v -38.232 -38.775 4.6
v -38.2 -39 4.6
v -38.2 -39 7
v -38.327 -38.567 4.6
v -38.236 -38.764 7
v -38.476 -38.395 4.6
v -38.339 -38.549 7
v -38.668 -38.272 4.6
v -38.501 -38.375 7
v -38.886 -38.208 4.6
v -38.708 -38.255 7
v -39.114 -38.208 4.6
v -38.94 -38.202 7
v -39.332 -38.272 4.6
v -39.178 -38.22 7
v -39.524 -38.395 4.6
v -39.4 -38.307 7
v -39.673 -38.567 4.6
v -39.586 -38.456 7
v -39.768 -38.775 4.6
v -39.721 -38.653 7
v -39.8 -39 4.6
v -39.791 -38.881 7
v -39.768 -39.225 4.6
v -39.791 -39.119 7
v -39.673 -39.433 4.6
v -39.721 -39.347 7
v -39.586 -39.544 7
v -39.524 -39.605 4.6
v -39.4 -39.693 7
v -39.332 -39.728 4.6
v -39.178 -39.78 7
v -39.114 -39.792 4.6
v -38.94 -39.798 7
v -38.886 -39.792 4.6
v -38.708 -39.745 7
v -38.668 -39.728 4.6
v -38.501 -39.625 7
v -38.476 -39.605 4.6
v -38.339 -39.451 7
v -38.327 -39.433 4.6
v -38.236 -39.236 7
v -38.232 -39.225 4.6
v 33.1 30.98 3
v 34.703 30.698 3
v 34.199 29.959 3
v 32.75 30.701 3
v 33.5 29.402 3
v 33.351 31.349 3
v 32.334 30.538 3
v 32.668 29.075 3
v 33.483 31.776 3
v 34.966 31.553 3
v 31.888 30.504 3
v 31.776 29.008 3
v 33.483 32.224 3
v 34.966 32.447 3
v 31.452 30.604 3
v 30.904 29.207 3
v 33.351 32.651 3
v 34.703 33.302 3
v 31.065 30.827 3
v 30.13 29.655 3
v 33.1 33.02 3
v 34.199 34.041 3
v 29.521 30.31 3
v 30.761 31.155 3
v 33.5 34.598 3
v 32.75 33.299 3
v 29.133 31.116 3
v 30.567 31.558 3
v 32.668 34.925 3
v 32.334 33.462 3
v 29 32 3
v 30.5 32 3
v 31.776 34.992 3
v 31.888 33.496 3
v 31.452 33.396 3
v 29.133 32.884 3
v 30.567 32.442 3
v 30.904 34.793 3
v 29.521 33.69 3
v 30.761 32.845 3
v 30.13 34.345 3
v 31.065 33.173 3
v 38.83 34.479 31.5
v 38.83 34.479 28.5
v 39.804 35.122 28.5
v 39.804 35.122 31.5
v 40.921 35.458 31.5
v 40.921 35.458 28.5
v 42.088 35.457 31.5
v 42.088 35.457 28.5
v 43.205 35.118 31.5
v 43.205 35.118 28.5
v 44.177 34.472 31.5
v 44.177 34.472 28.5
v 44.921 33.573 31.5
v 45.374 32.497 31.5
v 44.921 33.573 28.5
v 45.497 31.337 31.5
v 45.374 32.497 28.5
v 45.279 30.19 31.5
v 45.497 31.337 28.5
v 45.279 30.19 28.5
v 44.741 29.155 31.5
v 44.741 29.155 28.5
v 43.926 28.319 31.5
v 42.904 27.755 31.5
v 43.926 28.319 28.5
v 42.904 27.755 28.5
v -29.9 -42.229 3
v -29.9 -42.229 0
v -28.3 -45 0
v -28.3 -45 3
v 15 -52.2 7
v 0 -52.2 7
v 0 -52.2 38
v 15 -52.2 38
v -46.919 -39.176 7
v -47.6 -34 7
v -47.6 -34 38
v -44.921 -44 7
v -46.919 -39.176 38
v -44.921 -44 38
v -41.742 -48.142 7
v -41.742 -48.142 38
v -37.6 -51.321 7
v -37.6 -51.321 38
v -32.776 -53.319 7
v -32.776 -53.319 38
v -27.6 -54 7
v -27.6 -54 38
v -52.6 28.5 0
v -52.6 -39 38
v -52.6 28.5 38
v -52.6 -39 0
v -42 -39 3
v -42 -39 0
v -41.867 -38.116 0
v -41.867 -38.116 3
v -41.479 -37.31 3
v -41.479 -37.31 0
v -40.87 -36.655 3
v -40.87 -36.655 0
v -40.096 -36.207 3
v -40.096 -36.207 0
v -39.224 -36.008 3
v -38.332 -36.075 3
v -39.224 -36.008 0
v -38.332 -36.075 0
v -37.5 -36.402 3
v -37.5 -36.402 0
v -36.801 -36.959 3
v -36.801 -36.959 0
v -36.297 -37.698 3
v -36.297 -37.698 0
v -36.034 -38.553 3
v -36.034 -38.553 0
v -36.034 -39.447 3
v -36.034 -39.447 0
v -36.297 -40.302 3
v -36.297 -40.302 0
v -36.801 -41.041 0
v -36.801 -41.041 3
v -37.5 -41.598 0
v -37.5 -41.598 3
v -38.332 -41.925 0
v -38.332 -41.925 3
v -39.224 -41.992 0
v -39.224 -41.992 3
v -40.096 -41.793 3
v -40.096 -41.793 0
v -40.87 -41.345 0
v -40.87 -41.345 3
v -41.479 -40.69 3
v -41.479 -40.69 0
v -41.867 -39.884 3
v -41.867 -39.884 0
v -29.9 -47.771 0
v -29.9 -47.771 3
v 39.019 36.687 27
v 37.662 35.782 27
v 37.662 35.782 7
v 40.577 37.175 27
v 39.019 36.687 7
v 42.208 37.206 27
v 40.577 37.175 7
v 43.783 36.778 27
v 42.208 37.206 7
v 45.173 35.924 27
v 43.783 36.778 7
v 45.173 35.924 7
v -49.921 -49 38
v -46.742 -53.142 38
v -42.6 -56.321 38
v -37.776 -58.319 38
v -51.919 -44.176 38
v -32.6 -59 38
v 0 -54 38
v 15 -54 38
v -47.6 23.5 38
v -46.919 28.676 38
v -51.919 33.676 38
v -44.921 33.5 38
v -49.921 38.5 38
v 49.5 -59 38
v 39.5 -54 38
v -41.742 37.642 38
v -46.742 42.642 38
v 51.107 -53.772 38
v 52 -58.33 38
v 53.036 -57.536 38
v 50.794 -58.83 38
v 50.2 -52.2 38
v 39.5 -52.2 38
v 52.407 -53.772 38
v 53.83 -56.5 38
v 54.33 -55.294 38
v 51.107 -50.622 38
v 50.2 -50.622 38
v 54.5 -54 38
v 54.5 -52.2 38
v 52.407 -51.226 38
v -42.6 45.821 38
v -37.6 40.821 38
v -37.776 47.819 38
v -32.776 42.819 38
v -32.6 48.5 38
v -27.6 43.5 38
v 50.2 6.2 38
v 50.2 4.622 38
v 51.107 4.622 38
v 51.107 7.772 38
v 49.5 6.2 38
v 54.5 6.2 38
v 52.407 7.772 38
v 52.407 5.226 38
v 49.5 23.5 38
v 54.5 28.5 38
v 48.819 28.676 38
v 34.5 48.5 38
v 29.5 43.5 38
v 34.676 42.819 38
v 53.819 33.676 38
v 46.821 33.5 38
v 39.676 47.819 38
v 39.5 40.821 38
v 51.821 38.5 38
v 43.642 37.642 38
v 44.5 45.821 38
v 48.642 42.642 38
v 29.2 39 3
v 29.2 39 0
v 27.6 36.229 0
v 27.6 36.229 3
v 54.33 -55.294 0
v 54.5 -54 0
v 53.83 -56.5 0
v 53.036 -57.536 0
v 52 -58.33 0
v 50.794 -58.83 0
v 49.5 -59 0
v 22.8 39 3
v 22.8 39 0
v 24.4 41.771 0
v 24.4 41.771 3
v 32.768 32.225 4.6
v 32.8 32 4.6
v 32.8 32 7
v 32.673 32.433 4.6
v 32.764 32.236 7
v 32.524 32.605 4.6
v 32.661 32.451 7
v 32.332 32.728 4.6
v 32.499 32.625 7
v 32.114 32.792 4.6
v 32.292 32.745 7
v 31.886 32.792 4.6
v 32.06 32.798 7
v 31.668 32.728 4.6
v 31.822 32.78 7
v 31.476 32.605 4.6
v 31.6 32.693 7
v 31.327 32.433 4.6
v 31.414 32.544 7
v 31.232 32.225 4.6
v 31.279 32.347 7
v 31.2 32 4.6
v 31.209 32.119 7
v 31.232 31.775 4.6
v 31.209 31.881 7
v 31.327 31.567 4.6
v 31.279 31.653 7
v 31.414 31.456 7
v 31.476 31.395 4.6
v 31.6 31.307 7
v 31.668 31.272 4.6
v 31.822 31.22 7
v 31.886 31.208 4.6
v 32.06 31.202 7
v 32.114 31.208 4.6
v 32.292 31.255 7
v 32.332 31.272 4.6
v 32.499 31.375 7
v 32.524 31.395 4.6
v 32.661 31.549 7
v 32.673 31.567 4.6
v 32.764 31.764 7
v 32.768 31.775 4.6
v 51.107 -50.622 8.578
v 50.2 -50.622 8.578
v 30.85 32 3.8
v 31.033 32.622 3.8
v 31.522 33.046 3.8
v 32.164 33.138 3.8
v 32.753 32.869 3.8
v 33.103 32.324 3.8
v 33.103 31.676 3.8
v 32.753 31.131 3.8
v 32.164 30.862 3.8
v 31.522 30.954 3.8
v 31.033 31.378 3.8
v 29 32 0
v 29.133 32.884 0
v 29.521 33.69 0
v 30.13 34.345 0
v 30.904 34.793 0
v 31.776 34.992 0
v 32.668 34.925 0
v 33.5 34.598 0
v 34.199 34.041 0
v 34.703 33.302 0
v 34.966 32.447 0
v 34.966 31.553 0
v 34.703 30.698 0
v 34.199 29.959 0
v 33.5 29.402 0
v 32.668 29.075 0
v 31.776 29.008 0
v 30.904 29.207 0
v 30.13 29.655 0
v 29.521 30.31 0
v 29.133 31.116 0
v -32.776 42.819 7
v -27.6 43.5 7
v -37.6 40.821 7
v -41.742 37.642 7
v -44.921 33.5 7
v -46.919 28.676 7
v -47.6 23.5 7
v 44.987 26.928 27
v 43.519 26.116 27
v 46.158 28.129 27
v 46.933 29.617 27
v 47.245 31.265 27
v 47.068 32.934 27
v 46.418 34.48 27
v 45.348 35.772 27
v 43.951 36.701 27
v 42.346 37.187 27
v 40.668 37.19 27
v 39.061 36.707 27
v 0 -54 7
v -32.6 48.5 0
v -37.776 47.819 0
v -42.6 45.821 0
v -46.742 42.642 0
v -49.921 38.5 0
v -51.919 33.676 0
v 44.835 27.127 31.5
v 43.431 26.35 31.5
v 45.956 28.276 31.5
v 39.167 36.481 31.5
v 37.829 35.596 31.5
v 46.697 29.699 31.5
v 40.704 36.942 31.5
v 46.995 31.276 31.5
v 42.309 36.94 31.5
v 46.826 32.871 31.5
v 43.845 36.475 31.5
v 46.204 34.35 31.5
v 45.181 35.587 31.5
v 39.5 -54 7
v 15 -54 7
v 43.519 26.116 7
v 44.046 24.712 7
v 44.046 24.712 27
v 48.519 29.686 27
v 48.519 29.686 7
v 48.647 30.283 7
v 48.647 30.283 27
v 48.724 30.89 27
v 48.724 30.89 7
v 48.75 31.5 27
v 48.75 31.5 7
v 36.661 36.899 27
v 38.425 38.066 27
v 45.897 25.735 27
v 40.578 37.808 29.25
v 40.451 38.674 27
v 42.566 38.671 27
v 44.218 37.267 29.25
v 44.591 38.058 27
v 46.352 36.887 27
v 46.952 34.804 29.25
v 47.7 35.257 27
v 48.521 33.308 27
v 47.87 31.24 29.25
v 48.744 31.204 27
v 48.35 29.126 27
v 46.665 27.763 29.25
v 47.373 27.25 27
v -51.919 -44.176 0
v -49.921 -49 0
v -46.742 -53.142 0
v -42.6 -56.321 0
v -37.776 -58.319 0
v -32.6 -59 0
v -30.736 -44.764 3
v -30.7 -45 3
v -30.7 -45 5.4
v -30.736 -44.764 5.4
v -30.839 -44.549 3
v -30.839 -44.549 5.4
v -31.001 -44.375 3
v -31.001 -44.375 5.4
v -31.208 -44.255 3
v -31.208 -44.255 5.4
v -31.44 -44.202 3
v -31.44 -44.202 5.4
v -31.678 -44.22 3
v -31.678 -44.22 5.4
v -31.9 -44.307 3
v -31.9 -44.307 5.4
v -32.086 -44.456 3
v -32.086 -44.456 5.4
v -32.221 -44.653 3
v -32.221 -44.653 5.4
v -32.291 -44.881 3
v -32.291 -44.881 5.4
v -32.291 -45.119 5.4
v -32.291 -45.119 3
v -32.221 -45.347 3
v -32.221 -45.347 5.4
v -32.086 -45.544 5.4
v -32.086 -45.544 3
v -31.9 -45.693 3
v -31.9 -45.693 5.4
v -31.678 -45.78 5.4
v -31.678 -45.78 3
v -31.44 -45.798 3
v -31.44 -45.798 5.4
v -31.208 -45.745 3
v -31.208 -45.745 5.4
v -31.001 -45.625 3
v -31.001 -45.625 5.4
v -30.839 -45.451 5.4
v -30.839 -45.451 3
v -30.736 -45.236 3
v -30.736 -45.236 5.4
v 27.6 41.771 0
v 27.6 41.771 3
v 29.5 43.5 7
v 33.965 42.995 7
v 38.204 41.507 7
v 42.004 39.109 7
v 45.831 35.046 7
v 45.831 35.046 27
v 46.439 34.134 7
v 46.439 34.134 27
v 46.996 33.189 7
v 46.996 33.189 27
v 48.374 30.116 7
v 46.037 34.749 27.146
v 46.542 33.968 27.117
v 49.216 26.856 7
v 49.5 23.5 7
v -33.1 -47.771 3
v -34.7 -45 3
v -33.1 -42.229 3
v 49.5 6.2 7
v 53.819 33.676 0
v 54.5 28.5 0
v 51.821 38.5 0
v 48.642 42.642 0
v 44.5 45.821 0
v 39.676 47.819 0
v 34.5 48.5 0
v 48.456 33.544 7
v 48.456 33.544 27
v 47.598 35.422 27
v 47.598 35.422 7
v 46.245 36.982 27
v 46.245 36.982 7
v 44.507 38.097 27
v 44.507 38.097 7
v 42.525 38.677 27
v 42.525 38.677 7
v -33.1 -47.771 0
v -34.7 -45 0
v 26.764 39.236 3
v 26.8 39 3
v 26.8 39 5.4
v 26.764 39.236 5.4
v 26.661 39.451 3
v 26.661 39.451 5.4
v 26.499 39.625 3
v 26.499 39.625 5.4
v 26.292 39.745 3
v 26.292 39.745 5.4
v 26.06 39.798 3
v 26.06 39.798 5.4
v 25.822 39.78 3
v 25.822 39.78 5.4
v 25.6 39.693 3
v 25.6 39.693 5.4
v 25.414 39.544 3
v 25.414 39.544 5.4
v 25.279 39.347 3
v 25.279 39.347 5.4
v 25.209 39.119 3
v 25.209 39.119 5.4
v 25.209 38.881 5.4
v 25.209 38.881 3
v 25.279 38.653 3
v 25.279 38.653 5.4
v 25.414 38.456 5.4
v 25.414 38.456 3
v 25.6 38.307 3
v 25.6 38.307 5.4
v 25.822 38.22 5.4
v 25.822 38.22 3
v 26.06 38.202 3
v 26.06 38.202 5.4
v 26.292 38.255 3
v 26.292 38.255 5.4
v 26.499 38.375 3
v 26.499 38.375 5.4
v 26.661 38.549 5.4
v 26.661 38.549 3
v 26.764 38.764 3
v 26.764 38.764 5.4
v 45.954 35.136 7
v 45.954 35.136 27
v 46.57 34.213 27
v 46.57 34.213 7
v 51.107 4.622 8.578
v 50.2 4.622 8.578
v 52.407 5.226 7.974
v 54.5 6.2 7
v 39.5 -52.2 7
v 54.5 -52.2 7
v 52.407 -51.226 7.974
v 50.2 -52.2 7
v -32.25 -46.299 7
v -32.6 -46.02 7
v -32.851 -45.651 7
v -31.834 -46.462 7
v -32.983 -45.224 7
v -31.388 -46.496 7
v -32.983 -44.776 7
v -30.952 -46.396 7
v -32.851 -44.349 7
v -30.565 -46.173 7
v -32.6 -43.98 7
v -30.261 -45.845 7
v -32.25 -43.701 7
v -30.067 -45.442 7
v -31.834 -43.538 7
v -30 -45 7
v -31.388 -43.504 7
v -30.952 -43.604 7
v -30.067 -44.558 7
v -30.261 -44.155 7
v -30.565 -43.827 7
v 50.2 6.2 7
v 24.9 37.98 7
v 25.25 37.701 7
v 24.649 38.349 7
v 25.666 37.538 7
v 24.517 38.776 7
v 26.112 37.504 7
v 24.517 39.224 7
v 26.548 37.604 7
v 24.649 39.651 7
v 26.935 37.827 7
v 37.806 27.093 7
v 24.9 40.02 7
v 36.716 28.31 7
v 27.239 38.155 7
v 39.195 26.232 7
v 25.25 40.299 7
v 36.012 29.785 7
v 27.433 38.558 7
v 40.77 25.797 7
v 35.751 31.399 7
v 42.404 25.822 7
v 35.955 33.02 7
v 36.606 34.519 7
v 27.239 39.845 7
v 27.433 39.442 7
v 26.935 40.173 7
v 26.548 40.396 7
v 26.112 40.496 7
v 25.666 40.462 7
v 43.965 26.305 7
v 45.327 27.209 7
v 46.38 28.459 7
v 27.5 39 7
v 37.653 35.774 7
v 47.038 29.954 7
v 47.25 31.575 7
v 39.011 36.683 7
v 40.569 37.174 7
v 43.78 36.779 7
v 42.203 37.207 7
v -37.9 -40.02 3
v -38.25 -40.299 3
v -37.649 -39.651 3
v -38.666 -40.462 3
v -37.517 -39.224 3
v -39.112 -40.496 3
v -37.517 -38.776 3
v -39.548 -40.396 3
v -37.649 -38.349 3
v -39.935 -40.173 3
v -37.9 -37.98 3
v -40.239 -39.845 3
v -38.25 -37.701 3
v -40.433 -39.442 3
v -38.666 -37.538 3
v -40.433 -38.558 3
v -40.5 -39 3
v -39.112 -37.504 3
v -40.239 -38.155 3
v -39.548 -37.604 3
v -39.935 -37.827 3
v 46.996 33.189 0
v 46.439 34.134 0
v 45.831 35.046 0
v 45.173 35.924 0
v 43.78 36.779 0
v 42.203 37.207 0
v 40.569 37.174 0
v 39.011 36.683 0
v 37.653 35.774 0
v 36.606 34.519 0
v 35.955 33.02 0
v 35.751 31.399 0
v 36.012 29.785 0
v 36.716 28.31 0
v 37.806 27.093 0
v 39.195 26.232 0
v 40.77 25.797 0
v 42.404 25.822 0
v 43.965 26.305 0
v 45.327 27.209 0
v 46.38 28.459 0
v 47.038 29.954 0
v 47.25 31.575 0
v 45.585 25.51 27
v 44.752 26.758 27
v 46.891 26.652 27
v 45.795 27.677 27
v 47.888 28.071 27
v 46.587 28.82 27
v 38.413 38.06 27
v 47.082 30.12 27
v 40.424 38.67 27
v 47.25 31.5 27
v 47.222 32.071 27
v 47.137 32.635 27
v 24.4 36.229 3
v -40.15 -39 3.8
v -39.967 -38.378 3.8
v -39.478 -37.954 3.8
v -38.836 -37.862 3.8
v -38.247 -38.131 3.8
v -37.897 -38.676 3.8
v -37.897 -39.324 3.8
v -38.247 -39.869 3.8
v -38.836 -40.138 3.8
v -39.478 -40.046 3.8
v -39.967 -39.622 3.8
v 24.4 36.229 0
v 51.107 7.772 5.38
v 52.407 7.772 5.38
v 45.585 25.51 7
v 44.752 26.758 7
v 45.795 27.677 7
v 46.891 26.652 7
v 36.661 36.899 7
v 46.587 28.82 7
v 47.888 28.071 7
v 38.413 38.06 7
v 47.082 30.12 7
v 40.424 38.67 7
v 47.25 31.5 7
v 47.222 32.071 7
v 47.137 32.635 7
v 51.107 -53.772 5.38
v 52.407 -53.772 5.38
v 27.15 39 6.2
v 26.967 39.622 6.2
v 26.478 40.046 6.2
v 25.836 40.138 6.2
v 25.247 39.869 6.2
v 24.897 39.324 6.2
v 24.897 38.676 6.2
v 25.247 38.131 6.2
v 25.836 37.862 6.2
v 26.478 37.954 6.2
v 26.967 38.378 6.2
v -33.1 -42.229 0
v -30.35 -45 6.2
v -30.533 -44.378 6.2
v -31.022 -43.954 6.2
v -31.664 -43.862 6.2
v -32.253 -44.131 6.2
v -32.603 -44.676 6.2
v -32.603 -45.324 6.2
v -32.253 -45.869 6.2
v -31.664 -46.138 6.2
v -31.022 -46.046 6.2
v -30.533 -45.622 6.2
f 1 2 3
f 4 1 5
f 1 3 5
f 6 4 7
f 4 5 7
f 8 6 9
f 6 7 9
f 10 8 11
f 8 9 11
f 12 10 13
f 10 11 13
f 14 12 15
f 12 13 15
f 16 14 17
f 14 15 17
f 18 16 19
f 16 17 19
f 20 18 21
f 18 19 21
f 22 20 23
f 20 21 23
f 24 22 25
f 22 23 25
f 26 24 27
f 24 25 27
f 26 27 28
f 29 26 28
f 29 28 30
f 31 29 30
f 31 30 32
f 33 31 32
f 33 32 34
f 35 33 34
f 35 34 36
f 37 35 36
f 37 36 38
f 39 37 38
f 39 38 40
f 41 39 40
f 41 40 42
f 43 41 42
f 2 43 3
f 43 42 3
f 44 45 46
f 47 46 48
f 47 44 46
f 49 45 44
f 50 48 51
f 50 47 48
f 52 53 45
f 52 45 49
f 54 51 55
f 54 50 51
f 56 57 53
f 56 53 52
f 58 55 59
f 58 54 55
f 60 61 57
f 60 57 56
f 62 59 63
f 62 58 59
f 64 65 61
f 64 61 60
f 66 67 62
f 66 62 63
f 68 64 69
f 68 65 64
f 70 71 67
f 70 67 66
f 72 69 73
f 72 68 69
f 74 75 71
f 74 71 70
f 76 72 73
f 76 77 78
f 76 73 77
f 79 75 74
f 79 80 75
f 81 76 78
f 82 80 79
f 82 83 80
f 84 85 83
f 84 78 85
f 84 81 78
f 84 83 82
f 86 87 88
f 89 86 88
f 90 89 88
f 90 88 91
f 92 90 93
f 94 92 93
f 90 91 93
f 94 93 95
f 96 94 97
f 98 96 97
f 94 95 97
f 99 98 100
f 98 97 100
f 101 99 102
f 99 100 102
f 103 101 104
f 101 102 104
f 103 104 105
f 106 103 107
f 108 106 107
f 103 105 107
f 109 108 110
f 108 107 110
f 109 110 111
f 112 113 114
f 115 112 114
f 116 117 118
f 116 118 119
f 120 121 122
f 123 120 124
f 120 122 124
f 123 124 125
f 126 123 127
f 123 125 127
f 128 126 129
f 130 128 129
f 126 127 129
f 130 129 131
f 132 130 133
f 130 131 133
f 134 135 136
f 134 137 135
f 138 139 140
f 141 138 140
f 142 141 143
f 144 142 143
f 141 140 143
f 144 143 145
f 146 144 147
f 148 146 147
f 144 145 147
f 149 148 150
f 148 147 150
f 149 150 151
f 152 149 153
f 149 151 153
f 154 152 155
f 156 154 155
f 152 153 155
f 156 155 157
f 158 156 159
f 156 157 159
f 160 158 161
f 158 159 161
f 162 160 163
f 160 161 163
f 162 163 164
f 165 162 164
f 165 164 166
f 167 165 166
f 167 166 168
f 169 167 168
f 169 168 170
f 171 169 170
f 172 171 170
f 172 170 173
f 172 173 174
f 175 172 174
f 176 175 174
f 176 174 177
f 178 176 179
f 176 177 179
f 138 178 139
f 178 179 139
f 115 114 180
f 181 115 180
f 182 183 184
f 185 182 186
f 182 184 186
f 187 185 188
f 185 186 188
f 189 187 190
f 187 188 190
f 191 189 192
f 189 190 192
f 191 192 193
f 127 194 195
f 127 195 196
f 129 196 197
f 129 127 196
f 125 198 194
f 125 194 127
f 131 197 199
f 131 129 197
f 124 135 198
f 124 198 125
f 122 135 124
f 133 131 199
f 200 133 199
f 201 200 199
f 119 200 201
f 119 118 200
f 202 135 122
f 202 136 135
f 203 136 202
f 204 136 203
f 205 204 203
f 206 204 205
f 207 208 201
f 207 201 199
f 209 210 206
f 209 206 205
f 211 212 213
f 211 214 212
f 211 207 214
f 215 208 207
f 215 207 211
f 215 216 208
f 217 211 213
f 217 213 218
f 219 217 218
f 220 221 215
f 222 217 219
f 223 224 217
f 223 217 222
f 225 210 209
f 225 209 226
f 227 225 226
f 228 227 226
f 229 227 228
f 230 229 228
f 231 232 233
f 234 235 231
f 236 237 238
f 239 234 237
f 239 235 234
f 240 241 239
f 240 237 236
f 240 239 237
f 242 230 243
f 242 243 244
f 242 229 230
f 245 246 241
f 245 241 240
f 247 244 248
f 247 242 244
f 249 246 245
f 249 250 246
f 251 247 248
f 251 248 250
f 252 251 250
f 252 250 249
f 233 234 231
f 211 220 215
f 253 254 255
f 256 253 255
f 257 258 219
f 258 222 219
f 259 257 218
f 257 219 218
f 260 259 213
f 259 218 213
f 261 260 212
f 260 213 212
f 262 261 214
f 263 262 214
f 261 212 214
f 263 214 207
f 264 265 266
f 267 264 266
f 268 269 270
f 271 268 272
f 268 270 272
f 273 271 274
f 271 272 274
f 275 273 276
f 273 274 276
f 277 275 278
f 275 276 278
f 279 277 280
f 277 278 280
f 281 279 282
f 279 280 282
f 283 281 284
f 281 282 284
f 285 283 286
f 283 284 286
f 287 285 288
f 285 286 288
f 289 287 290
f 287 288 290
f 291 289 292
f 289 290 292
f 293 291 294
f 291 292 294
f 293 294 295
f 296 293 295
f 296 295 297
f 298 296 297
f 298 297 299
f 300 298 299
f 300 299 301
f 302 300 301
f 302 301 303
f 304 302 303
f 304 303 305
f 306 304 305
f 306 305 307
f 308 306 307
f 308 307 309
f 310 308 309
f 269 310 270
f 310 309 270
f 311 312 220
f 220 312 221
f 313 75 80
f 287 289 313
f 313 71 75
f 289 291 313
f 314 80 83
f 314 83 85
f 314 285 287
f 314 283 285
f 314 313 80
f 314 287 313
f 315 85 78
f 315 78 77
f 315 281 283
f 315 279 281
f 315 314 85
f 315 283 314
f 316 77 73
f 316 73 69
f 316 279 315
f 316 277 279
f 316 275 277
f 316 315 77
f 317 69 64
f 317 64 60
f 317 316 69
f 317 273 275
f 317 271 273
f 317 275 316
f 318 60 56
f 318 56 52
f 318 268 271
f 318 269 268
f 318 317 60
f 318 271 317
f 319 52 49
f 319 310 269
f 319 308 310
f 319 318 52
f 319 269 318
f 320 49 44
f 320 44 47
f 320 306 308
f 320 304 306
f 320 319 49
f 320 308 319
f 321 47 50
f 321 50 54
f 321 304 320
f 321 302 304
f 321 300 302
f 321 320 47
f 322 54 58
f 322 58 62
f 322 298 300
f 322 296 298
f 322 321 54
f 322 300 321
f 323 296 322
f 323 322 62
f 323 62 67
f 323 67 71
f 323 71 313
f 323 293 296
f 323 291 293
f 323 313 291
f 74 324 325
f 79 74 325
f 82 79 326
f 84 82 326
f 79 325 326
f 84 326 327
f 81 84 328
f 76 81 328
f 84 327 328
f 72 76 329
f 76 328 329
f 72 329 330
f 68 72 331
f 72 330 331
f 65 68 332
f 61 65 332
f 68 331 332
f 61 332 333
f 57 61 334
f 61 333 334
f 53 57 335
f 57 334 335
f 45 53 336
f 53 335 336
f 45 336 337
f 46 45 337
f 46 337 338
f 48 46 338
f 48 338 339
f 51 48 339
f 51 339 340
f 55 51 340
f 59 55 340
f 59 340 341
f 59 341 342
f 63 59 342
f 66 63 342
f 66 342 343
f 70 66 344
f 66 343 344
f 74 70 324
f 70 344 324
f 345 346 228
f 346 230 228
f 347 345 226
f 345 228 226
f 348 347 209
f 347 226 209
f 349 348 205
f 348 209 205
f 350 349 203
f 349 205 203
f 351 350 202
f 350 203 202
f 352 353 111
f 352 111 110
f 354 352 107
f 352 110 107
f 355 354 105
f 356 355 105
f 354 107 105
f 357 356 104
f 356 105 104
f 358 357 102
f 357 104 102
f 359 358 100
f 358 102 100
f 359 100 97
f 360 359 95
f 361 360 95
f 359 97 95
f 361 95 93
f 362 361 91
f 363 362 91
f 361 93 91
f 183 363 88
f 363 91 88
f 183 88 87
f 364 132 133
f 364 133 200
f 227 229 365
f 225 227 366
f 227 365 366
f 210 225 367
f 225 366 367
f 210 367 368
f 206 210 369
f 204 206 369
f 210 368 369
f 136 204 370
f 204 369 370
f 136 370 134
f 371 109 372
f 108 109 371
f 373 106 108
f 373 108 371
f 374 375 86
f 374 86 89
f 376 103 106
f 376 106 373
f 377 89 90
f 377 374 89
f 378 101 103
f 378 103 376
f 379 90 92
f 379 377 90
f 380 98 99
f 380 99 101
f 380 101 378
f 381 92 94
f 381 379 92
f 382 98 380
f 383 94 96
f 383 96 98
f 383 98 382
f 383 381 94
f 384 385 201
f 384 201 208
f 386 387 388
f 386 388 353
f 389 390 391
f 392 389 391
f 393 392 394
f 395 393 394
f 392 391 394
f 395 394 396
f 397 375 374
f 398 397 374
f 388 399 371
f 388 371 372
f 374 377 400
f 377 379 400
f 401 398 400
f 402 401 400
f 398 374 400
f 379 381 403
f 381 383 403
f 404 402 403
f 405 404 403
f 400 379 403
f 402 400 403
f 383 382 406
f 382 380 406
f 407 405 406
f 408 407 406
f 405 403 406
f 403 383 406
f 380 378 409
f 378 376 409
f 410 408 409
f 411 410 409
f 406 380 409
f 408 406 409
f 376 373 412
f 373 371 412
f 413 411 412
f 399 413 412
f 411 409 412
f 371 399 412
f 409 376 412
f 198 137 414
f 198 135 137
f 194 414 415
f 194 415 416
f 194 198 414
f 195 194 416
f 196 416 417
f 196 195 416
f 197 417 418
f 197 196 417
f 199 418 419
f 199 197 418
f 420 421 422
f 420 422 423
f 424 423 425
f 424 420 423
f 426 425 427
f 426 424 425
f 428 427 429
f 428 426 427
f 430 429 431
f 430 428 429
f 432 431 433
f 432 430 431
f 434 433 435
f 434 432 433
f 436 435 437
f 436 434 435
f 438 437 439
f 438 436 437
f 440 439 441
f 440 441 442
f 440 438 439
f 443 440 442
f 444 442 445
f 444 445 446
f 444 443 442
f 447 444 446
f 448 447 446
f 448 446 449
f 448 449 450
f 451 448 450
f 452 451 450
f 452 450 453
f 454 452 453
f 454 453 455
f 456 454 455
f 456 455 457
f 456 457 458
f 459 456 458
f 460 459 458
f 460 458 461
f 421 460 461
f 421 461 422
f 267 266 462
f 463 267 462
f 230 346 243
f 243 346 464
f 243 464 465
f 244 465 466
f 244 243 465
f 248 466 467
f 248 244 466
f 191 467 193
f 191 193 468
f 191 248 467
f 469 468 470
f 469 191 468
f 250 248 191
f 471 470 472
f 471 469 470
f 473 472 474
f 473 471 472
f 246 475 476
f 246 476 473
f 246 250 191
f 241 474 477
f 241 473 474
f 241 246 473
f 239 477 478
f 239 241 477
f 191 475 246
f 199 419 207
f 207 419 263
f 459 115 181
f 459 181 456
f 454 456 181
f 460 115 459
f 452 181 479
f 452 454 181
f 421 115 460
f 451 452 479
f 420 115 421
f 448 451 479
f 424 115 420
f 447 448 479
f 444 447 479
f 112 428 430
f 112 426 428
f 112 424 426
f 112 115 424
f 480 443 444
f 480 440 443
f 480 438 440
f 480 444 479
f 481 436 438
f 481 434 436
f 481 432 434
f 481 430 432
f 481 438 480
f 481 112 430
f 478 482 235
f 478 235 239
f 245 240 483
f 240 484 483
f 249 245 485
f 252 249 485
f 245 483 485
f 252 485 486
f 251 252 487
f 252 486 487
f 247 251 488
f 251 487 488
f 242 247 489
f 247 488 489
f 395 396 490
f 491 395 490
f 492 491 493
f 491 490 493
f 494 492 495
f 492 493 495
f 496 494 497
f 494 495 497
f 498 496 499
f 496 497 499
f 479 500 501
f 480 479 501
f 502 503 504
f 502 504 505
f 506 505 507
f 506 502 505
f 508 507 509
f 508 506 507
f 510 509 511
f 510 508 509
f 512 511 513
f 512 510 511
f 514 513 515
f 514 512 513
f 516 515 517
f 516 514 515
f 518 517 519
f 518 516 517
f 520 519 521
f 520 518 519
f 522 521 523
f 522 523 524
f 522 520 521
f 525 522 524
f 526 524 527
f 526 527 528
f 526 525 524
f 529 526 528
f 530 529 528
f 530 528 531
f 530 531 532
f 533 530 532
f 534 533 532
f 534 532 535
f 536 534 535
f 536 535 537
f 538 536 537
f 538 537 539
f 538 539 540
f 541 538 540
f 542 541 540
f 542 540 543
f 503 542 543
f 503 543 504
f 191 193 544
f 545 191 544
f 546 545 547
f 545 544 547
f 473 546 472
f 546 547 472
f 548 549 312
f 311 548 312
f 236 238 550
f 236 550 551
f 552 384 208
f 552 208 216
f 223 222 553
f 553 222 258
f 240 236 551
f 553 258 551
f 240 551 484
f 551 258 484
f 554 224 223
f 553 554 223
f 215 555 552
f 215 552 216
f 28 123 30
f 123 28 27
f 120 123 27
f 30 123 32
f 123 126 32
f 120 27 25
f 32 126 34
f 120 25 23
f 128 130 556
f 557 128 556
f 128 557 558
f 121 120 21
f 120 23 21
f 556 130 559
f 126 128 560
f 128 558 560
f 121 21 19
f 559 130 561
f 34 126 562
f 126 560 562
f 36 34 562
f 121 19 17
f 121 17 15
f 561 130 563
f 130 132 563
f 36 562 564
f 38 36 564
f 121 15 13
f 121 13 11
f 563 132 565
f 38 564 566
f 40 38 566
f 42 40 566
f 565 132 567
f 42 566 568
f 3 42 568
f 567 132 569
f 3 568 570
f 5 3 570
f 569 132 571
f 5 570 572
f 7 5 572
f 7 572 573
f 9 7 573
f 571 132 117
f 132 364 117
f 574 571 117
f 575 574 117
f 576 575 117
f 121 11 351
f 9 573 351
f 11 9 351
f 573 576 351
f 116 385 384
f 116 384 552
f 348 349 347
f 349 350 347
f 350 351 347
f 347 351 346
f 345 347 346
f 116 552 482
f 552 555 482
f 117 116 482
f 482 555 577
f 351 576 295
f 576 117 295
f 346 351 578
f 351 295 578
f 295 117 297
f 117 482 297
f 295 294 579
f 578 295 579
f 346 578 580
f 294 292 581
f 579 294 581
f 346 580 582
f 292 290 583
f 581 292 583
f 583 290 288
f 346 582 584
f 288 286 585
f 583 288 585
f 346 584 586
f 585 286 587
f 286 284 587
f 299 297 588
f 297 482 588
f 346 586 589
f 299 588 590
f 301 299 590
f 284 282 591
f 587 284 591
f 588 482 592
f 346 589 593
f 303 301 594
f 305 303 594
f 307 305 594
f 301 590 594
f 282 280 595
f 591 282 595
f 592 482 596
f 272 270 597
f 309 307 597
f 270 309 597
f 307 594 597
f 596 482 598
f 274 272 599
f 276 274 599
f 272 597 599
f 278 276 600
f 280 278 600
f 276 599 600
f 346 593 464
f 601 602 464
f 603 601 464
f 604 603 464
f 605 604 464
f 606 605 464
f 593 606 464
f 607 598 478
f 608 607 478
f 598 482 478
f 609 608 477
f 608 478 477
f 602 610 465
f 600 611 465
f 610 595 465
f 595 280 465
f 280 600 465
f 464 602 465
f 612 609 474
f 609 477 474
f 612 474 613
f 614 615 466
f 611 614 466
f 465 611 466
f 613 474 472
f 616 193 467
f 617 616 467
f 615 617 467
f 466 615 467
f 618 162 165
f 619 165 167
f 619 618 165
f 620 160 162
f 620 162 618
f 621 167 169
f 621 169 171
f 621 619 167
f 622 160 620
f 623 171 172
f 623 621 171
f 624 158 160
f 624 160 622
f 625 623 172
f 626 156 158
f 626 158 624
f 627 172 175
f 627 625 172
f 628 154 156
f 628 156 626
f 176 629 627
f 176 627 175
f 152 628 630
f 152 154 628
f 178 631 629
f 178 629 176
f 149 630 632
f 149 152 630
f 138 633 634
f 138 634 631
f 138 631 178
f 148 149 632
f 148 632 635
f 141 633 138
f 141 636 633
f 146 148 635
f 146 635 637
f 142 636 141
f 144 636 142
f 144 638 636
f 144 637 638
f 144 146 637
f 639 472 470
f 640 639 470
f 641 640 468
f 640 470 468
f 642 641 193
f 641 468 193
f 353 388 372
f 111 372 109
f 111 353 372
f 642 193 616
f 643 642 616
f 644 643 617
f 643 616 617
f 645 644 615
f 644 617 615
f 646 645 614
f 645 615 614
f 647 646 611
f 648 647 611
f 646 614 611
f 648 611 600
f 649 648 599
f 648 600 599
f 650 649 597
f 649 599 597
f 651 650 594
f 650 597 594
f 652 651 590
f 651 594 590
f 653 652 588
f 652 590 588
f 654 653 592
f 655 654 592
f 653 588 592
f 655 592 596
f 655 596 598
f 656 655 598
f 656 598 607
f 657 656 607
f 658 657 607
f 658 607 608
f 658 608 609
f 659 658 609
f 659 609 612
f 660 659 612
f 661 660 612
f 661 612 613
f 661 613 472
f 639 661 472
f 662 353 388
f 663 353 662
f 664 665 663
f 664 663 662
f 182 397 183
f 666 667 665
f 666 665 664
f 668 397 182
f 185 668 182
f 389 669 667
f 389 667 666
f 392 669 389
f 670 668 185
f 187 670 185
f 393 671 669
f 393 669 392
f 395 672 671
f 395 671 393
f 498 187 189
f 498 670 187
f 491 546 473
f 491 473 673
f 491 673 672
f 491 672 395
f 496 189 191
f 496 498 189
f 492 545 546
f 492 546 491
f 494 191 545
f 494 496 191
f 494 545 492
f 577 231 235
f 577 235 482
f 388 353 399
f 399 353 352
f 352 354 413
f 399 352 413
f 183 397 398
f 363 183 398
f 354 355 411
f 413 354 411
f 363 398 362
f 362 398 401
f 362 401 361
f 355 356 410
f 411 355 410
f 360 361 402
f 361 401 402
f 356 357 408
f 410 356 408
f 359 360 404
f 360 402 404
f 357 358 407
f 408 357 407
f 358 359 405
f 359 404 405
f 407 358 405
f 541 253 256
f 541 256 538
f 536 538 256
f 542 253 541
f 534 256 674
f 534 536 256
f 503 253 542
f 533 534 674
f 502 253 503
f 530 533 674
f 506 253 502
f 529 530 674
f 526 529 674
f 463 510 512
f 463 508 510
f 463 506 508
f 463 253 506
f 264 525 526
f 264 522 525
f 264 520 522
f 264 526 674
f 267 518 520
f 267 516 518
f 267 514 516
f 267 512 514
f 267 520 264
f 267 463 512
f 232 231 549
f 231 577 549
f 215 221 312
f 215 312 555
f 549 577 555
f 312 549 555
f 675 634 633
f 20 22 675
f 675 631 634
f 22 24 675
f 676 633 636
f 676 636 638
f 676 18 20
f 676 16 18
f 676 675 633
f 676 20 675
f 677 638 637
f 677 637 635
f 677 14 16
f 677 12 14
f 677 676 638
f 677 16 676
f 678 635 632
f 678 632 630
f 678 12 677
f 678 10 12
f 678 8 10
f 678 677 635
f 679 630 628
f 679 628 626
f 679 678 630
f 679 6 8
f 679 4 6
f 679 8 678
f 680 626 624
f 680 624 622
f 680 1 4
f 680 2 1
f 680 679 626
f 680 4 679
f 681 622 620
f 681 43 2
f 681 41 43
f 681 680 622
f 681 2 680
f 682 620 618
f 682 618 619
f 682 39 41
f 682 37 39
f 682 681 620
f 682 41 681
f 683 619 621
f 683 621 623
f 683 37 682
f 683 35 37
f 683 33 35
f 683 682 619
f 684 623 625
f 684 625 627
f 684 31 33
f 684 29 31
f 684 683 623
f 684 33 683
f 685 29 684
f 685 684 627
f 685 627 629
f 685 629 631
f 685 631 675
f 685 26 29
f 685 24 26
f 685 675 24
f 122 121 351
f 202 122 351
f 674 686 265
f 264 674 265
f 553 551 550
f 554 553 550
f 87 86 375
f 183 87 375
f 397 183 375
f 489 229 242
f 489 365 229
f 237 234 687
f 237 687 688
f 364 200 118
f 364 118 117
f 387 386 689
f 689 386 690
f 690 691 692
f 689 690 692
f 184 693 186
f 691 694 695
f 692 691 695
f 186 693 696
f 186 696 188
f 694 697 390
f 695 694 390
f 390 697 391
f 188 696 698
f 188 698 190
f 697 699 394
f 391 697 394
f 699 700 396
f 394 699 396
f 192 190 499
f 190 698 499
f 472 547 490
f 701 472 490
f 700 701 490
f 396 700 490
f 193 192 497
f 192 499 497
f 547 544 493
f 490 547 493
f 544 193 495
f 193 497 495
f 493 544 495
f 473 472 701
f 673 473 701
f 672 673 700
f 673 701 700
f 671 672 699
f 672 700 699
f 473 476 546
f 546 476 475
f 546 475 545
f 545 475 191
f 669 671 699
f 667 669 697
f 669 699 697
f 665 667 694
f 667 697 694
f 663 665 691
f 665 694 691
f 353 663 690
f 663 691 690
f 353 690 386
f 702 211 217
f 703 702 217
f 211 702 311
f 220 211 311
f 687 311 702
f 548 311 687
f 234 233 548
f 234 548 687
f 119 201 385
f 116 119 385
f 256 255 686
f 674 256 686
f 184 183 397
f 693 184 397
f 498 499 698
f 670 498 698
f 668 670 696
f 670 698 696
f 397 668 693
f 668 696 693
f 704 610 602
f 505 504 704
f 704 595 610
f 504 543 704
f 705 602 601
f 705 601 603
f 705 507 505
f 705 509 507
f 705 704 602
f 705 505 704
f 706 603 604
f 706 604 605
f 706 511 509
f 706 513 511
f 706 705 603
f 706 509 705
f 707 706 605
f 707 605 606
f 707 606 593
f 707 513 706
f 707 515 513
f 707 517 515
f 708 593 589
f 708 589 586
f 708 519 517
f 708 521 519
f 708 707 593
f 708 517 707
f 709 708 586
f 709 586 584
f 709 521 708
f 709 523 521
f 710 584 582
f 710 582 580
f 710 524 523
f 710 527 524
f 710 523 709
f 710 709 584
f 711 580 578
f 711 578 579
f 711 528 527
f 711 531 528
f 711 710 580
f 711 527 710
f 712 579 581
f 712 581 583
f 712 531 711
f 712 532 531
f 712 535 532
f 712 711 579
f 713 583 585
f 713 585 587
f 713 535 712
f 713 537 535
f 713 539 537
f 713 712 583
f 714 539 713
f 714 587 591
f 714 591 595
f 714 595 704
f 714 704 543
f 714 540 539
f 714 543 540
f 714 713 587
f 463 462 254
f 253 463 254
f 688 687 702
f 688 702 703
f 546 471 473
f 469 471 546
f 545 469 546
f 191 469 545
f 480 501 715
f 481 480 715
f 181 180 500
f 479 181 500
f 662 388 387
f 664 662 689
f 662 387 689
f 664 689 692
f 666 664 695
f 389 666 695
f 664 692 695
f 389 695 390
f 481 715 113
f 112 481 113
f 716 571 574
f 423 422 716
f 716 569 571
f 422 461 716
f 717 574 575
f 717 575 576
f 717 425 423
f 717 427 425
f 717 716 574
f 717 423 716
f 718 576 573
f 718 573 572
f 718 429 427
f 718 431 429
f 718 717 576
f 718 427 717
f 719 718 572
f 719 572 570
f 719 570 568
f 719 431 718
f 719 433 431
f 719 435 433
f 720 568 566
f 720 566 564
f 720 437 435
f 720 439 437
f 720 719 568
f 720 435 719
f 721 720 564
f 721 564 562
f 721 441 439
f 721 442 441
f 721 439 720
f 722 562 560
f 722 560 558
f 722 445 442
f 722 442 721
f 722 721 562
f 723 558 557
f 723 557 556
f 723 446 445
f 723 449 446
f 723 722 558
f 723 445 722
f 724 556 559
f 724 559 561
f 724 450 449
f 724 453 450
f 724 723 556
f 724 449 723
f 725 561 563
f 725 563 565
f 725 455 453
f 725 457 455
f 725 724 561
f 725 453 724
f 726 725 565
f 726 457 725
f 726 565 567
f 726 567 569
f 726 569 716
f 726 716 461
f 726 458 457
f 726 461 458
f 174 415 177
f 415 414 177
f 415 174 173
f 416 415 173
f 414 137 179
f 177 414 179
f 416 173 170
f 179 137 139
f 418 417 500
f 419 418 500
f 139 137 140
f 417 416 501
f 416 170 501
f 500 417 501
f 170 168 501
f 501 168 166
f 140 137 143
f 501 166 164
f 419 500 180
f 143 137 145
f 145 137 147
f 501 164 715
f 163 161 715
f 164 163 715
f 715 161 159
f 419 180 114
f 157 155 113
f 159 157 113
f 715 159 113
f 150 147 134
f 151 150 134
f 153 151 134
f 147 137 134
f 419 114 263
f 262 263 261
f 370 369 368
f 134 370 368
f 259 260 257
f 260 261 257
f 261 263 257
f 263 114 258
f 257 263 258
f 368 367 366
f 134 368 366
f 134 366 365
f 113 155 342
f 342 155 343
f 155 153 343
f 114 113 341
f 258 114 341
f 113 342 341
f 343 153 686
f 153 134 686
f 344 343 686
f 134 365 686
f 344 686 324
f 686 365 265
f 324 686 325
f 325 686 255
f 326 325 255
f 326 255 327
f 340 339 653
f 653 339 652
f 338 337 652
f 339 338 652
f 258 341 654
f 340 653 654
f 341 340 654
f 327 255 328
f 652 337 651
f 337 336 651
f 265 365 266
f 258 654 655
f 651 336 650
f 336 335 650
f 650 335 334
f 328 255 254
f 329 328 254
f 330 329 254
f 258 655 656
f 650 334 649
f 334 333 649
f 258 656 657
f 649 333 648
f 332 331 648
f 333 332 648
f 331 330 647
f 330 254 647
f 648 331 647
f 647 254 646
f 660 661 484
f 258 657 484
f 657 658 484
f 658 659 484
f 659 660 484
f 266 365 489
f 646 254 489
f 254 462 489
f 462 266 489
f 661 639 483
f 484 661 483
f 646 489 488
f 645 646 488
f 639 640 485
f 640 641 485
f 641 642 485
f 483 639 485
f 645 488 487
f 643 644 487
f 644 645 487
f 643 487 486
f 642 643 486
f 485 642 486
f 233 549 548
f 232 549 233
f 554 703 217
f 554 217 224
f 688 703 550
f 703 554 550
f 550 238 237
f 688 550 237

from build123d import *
from OCP.BRepFilletAPI import BRepFilletAPI_MakeChamfer

# Parameters (mm, degrees)
SKETCH1_W           = 97.1
SKETCH1_H           = 97.5
SKETCH1_R           = 0.8
BOSS_EXTRUDE1_DEPTH = 7
CUT_EXTRUDE1_DEPTH  = 3
SKETCH3_W           = 107.1
SKETCH3_H           = 107.5
SKETCH3_W_2         = 97.1
SKETCH3_H_2         = 97.5
BOSS_EXTRUDE2_DEPTH = 7
SKETCH4_W           = 107.1
SKETCH4_H           = 107.5
SKETCH4_W_2         = 97.1
SKETCH4_H_2         = 97.5
BOSS_EXTRUDE3_DEPTH = 31
SKETCH5_W           = 31
SKETCH5_H           = 58
CUT_EXTRUDE2_DEPTH  = 33
MOVE_FACE2_BY       = 10
MOVE_FACE3_BY       = 0.2
SKETCH6_W           = 15
SKETCH6_H           = 31
BOSS_EXTRUDE4_DEPTH = 1.8
MOVE_FACE4_BY       = 0.2
BOSS_EXTRUDE5_DEPTH = 31
BOSS_EXTRUDE6_DEPTH = 58.4
SKETCH13_R          = 1.5
SKETCH14_R          = 0.8
SKETCH13_4_R        = 1.5
SKETCH14_4_R        = 0.8
FILLET2_R           = 20
FILLET3_R           = 20
FILLET4_R           = 20
FILLET5_R           = 20
FILLET6_R           = 5
CHAMFER1_SIZE       = 1
CHAMFER1_SIZE2      = 0.421668948
SKETCH16_R          = 0.8
CUT_EXTRUDE3_DEPTH  = 87.094424907
SKETCH20_W          = 1.3
SKETCH20_H          = 61.543461502
CUT_EXTRUDE4_DEPTH  = 32.62
BOSS_EXTRUDE7_DEPTH = 20
SKETCH25_R          = 7.25
BOSS_EXTRUDE8_DEPTH = 4.5
SKETCH24_R          = 5.75
SKETCH23_R          = 4
SKETCH26_R          = 4
CUT_EXTRUDE5_DEPTH  = 4.5
CUT_EXTRUDE6_DEPTH  = 34.5
CUT_EXTRUDE7_DEPTH  = 34.5
SKETCH34_R          = 3
CUT_EXTRUDE9_DEPTH  = 3
SKETCH36_R          = 1.5
SKETCH35_R          = 0.8
SKETCH36_3_R        = 1.5
SKETCH35_3_R        = 0.8


with BuildPart() as part:
    # Sketch1 → Boss-Extrude1 (new body)
    with BuildSketch(Plane.XY):
        with Locations((0.95, -5.25)):
            Rectangle(SKETCH1_W, SKETCH1_H)
        with Locations((-31.5, -45)):
            Circle(SKETCH1_R, mode=Mode.SUBTRACT)
        with Locations((26, 39)):
            Circle(SKETCH1_R, mode=Mode.SUBTRACT)
    extrude(amount=BOSS_EXTRUDE1_DEPTH)

    # Sketch2 → Cut-Extrude1 (cut)
    with BuildSketch(Plane(origin=(0, 0, 0), x_dir=(-1, 0, 0), z_dir=(0, 0, -1))):
        Polygon((-24.4, 36.228718708), (-22.8, 39), (-24.4, 41.771281292), (-27.6, 41.771281292), (-29.2, 39), (-27.6, 36.228718708), align=None)
        Polygon((33.1, -47.771281292), (34.7, -45), (33.1, -42.228718708), (29.9, -42.228718708), (28.3, -45), (29.9, -47.771281292), align=None)
    extrude(amount=-CUT_EXTRUDE1_DEPTH, mode=Mode.SUBTRACT)

    # Sketch3 → Boss-Extrude2 (add)
    with BuildSketch(Plane.XY.offset(7)):
        with Locations((0.95, -5.25)):
            Rectangle(SKETCH3_W, SKETCH3_H)
        with Locations((0.95, -5.25)):
            Rectangle(SKETCH3_W_2, SKETCH3_H_2, mode=Mode.SUBTRACT)
    extrude(amount=-BOSS_EXTRUDE2_DEPTH)

    # Sketch4 → Boss-Extrude3 (add)
    with BuildSketch(Plane.XY.offset(7)):
        with Locations((0.95, -5.25)):
            Rectangle(SKETCH4_W, SKETCH4_H)
        with Locations((0.95, -5.25)):
            Rectangle(SKETCH4_W_2, SKETCH4_H_2, mode=Mode.SUBTRACT)
    extrude(amount=BOSS_EXTRUDE3_DEPTH)

    # Sketch5 → Cut-Extrude2 (cut)
    with BuildSketch(Plane(origin=(54.5, 0, 0), x_dir=(0, 0, -1), z_dir=(1, 0, 0))):
        with Locations((-22.5, -23)):
            Rectangle(SKETCH5_W, SKETCH5_H)
    extrude(amount=-CUT_EXTRUDE2_DEPTH, mode=Mode.SUBTRACT)

    # Move Face2: a face moved outward by 10.0
    extrude(part.faces().sort_by_distance((49.5, -53, 22.5))[0], amount=MOVE_FACE2_BY, dir=(-1, 0, 0))

    # Move Face3: a face moved inward by 0.2
    extrude(part.faces().sort_by_distance((47, -52, 22.5))[0], amount=MOVE_FACE3_BY, dir=(0, -1, 0), mode=Mode.SUBTRACT)

    # Sketch6 → Boss-Extrude4 (add)
    with BuildSketch(Plane(origin=(0, -54, 0), x_dir=(1, 0, 0), z_dir=(0, 1, 0))):
        with Locations((7.5, -22.5)):
            Rectangle(SKETCH6_W, SKETCH6_H)
    extrude(amount=BOSS_EXTRUDE4_DEPTH)

    # Move Face4: a face moved inward by 0.2
    extrude(part.faces().sort_by_distance((52, 6, 22.5))[0], amount=MOVE_FACE4_BY, dir=(0, 1, 0), mode=Mode.SUBTRACT)

    # Sketch10 → Boss-Extrude5 (add)
    with BuildSketch(Plane.XY.offset(7)):
        Polygon((54.5, 6.2), (50.2, 6.2), (50.2, 4.2), align=None)
        Polygon((54.5, -52.2), (50.2, -52.2), (50.2, -50.2), align=None)
    extrude(amount=BOSS_EXTRUDE5_DEPTH)

    # Sketch11 → Boss-Extrude6 (add)
    with BuildSketch(Plane.XZ.offset(-6.2)):
        Polygon((50.2, 7), (54.5, 7), (50.2, 9), align=None)
    extrude(amount=BOSS_EXTRUDE6_DEPTH)

    # Sketch13 → Cut-Loft1 section 0
    with BuildSketch(Plane.XY.offset(7)):
        with Locations((-31.5, -45)):
            Circle(SKETCH13_R)
    # Sketch14 → Cut-Loft1 section 1
    with BuildSketch(Plane.XY.offset(5.4)):
        with Locations((-31.5, -45)):
            Circle(SKETCH14_R)
    loft(mode=Mode.SUBTRACT)

    # Sketch13<4> → Cut-Loft2 section 0
    with BuildSketch(Plane.XY.offset(7)):
        with Locations((26, 39)):
            Circle(SKETCH13_4_R)
    # Sketch14<4> → Cut-Loft2 section 1
    with BuildSketch(Plane.XY.offset(5.4)):
        with Locations((26, 39)):
            Circle(SKETCH14_4_R)
    loft(mode=Mode.SUBTRACT)

    # Fillet2
    fillet2_edges = [part.edges().sort_by_distance(p)[0] for p in [
        (-47.6, 43.5, 22.5),
    ]]
    fillet(fillet2_edges, radius=FILLET2_R)

    # Fillet3
    fillet3_edges = [part.edges().sort_by_distance(p)[0] for p in [
        (-47.6, -54, 22.5),
    ]]
    fillet(fillet3_edges, radius=FILLET3_R)

    # Fillet4
    fillet4_edges = [part.edges().sort_by_distance(p)[0] for p in [
        (49.5, 43.5, 22.5),
    ]]
    fillet(fillet4_edges, radius=FILLET4_R)

    # Fillet5
    fillet5_edges = [part.edges().sort_by_distance(p)[0] for p in [
        (-52.6, 48.5, 19),
        (54.5, 48.5, 19),
        (-52.6, -59, 19),
    ]]
    fillet(fillet5_edges, radius=FILLET5_R)

    # Fillet6
    fillet6_edges = [part.edges().sort_by_distance(p)[0] for p in [
        (54.5, -59, 19),
    ]]
    fillet(fillet6_edges, radius=FILLET6_R)

    # Chamfer1: one chamfer whose edges measure the first distance from different faces: ONE call of the kernel's chamfer builder (chamfer() names one face for all edges)
    chamfer1_edges_1 = [part.edges().sort_by_distance(p)[0] for p in [
        (50.2, 4.2, 23.5),
    ]]
    chamfer1_side_1 = [part.faces().sort_by_distance(p)[0] for p in [
        (52.373888889, 5.211111111, 22.994444444),
    ]]
    chamfer1_edges_2 = [part.edges().sort_by_distance(p)[0] for p in [
        (50.2, -50.2, 23.5),
    ]]
    chamfer1_side_2 = [part.faces().sort_by_distance(p)[0] for p in [
        (52.373888889, -51.211111111, 22.994444444),
    ]]
    chamfer1_edges_3 = [part.edges().sort_by_distance(p)[0] for p in [
        (50.2, -23, 9),
    ]]
    chamfer1_side_3 = [part.faces().sort_by_distance(p)[0] for p in [
        (52.375413712, -23, 7.988179669),
    ]]
    chamfer1 = BRepFilletAPI_MakeChamfer(part.part.solid().wrapped)
    for e in chamfer1_edges_1:
        chamfer1.Add(CHAMFER1_SIZE, CHAMFER1_SIZE2, e.wrapped, chamfer1_side_1[0].wrapped)  # the first distance lies on this face
    for e in chamfer1_edges_2:
        chamfer1.Add(CHAMFER1_SIZE, CHAMFER1_SIZE2, e.wrapped, chamfer1_side_2[0].wrapped)  # the first distance lies on this face
    for e in chamfer1_edges_3:
        chamfer1.Add(CHAMFER1_SIZE, CHAMFER1_SIZE2, e.wrapped, chamfer1_side_3[0].wrapped)  # the first distance lies on this face
    add(Compound.cast(chamfer1.Shape()), mode=Mode.REPLACE)

    # Sketch16 → Cut-Extrude3 (cut, through all)
    with BuildSketch(Plane.XY.offset(7)):
        with Locations((32, 32)):
            Circle(SKETCH16_R)
        with Locations((-39, -39)):
            Circle(SKETCH16_R)
    extrude(amount=-CUT_EXTRUDE3_DEPTH, mode=Mode.SUBTRACT)

    # Sketch20 → Cut-Extrude4 (cut)
    with BuildSketch(Plane.XY.offset(38)):
        with Locations((51.756630498, -23)):
            Rectangle(SKETCH20_W, SKETCH20_H)
    extrude(amount=-CUT_EXTRUDE4_DEPTH, mode=Mode.SUBTRACT)


with BuildPart() as body_2:
    # Sketch21 → Boss-Extrude7 (new body)
    with BuildSketch(Plane.XY.offset(7)):
        with BuildLine():
            ThreePointArc((44.045644952, 24.711613463), (46.890543586, 26.651851916), (48.519348561, 29.685820908))
            ThreePointArc((48.519348561, 29.685820908), (47.841657822, 31.4739318), (46.996296574, 33.189148889))
            ThreePointArc((46.996296574, 33.189148889), (47.186220419, 32.354047627), (47.25, 31.5))
            ThreePointArc((47.25, 31.5), (36.295038241, 29.056462997), (45.17317458, 35.923831881))
            ThreePointArc((45.17317458, 35.923831881), (43.915036208, 37.36386422), (42.525122593, 38.677159861))
            ThreePointArc((42.525122593, 38.677159861), (39.395877764, 38.437951399), (36.660912672, 36.898678897))
            ThreePointArc((36.660912672, 36.898678897), (35.299507241, 27.742821598), (44.045644952, 24.711613463))
        make_face()
        with BuildLine():
            ThreePointArc((46.996296574, 33.189148889), (47.841657822, 31.4739318), (48.519348561, 29.685820908))
            ThreePointArc((48.519348561, 29.685820908), (48.692105987, 30.585608691), (48.75, 31.5))
            ThreePointArc((48.75, 31.5), (46.976980865, 36.25028216), (42.525122593, 38.677159861))
            ThreePointArc((42.525122593, 38.677159861), (43.915036208, 37.36386422), (45.17317458, 35.923831881))
            ThreePointArc((45.17317458, 35.923831881), (46.284289192, 34.689526128), (46.996296574, 33.189148889))
        make_face()
    extrude(amount=BOSS_EXTRUDE7_DEPTH)


with BuildPart() as body_3:
    # Sketch25 → Boss-Extrude8 (new body)
    with BuildSketch(Plane.XY.offset(27)):
        with Locations((41.5, 31.5)):
            Circle(SKETCH25_R)
    extrude(amount=BOSS_EXTRUDE8_DEPTH)


with BuildPart() as cut_loft5_tool:
    # Sketch24 → Cut-Loft5 section 0
    with BuildSketch(Plane.XY.offset(27)):
        with Locations((41.5, 31.5)):
            Circle(SKETCH24_R)
    # Sketch23 → Cut-Loft5 section 1
    with BuildSketch(Plane.XY.offset(28.5)):
        with Locations((41.5, 31.5)):
            Circle(SKETCH23_R)
    loft()


with BuildPart() as part_1:
    add(part.part)

    # Cut-Loft5: cut by cut_loft5_tool
    add(cut_loft5_tool.part, mode=Mode.SUBTRACT)

    # Sketch31 → Cut-Extrude7 (cut)
    with BuildSketch(Plane.XY.offset(7)):
        with BuildLine():
            ThreePointArc((45.17317458, 35.923831881), (36.715710808, 28.310473872), (46.996296574, 33.189148889))
            ThreePointArc((46.996296574, 33.189148889), (46.141005887, 34.594003925), (45.17317458, 35.923831881))
        make_face()
    extrude(amount=-CUT_EXTRUDE7_DEPTH, mode=Mode.SUBTRACT)

    # Sketch34 → Cut-Extrude9 (cut)
    with BuildSketch(Plane(origin=(0, 0, 0), x_dir=(-1, 0, 0), z_dir=(0, 0, -1))):
        with Locations((-32, 32)):
            Circle(SKETCH34_R)
        with Locations((39, -39)):
            Circle(SKETCH34_R)
    extrude(amount=-CUT_EXTRUDE9_DEPTH, mode=Mode.SUBTRACT)

    # Sketch36 → Cut-Loft6 section 0
    with BuildSketch(Plane(origin=(0, 0, 3), x_dir=(-1, 0, 0), z_dir=(0, 0, -1))):
        with Locations((39, -39)):
            Circle(SKETCH36_R)
    # Sketch35 → Cut-Loft6 section 1
    with BuildSketch(Plane(origin=(0, 0, 4.6), x_dir=(-1, 0, 0), z_dir=(0, 0, -1))):
        with Locations((39, -39)):
            Circle(SKETCH35_R)
    loft(mode=Mode.SUBTRACT)

    # Sketch36<3> → Cut-Loft7 section 0
    with BuildSketch(Plane(origin=(0, 0, 3), x_dir=(-1, 0, 0), z_dir=(0, 0, -1))):
        with Locations((-32, 32)):
            Circle(SKETCH36_3_R)
    # Sketch35<3> → Cut-Loft7 section 1
    with BuildSketch(Plane(origin=(0, 0, 4.6), x_dir=(-1, 0, 0), z_dir=(0, 0, -1))):
        with Locations((-32, 32)):
            Circle(SKETCH35_3_R)
    loft(mode=Mode.SUBTRACT)


with BuildPart() as body_3_1:
    add(body_3.part)

    # Cut-Loft5: cut by cut_loft5_tool
    add(cut_loft5_tool.part, mode=Mode.SUBTRACT)

    # Sketch26 → Cut-Extrude5 (cut)
    with BuildSketch(Plane(origin=(0, 0, 28.5), x_dir=(-1, 0, 0), z_dir=(0, 0, -1))):
        with Locations((-41.5, 31.5)):
            Circle(SKETCH26_R)
    extrude(amount=-CUT_EXTRUDE5_DEPTH, mode=Mode.SUBTRACT)

    # Sketch28 → Cut-Revolve1 (revolve, cut)
    with BuildSketch(Plane(origin=(0, 31.5, 0), x_dir=(-1, 0, 0), z_dir=(0, -1, 0)), mode=Mode.PRIVATE) as cut_revolve1_sk:
        Polygon((-34.25, -31.5), (-34.25, -27), (-36, -31.5), align=None)
    revolve(cut_revolve1_sk.sketch.rotate(Axis((41.5, 31.5, 31.5), (0, 0, -1)), 180), axis=Axis((41.5, 31.5, 31.5), (0, 0, -1)), mode=Mode.SUBTRACT)


with BuildPart() as cut_extrude6_tool:
    # Sketch30 → Cut-Extrude6 (new body)
    with BuildSketch(Plane.XY.offset(7)):
        Polygon((41.5, 31.5), (36.660912672, 36.898678897), (28.18676226, 29.302903216), (36.772796235, 19.723981141), (44.045644952, 24.711613463), align=None)
    extrude(amount=CUT_EXTRUDE6_DEPTH)


with BuildPart() as body_2_1:
    add(body_2.part)

    # Cut-Extrude6: cut by cut_extrude6_tool
    add(cut_extrude6_tool.part, mode=Mode.SUBTRACT)


with BuildPart() as body_3_2:
    add(body_3_1.part)

    # Cut-Extrude6: cut by cut_extrude6_tool
    add(cut_extrude6_tool.part, mode=Mode.SUBTRACT)


solid = Compound([part_1.part, body_2_1.part, body_3_2.part])
